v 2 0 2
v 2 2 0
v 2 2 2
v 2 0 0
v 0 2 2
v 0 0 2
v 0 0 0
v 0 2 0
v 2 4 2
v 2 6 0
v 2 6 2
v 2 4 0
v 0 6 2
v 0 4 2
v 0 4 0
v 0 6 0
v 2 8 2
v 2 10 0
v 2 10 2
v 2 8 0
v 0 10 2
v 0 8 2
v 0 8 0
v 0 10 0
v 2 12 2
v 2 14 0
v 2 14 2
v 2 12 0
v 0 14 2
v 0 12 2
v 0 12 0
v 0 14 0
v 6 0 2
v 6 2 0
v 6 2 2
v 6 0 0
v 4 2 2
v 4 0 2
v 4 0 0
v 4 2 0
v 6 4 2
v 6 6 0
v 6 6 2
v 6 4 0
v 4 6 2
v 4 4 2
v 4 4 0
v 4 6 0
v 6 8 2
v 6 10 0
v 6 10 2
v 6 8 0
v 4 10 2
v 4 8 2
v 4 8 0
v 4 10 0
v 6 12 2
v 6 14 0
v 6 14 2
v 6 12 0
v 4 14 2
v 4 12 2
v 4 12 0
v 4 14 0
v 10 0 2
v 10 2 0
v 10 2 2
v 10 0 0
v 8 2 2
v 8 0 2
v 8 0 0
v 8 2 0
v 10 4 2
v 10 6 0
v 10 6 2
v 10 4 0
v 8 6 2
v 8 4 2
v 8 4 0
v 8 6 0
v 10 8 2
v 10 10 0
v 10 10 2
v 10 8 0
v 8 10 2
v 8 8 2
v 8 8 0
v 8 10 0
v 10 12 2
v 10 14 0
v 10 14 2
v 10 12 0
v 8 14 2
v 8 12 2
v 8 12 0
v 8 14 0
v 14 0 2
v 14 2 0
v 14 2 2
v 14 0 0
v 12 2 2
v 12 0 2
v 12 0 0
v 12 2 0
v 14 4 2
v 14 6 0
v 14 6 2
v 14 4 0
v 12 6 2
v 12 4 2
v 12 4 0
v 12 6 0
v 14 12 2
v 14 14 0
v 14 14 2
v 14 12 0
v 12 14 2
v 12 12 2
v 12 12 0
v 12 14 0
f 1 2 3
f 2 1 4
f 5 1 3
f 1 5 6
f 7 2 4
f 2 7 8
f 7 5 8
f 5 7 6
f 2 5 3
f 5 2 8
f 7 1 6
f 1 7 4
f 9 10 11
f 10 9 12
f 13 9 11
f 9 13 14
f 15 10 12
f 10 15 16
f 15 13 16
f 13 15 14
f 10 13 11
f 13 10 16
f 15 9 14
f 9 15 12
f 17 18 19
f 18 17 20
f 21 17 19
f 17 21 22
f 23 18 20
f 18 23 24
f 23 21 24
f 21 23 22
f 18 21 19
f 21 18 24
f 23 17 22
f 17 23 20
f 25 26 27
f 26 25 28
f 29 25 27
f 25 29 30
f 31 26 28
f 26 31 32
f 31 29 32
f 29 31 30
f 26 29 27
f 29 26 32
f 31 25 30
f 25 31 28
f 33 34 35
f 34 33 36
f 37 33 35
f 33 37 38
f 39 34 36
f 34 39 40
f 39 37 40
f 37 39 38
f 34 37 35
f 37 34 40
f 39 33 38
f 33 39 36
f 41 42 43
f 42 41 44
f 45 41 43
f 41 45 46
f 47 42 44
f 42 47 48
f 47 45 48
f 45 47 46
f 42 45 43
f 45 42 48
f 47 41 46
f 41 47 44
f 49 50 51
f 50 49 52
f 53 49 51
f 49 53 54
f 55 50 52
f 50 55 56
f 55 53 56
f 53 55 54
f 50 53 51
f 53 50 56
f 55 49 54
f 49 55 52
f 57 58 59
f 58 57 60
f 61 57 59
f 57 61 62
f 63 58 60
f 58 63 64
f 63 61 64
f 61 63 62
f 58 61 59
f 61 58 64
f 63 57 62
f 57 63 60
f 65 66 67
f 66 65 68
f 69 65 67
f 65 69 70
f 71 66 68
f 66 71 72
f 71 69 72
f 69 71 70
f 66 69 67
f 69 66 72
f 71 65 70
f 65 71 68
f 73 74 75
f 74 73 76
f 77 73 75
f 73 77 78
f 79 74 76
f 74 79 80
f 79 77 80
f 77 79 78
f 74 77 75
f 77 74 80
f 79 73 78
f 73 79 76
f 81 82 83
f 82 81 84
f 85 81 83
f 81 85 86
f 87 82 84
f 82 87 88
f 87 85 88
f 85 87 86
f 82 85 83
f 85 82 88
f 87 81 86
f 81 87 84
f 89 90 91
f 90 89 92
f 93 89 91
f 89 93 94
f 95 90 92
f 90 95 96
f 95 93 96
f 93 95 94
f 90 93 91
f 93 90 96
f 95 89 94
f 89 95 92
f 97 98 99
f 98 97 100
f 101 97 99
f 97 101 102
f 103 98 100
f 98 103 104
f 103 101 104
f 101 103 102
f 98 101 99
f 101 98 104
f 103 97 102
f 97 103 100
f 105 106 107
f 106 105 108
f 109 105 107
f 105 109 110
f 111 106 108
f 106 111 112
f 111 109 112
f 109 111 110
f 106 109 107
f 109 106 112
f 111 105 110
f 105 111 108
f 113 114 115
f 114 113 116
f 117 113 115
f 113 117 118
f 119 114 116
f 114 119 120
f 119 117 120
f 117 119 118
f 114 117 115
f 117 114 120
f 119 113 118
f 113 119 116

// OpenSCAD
union() {
  for (ix = [0:3]) {
    for (iy = [0:3]) {
      if (!(ix == 3 && iy == 2)) {
        translate([ix * 4, iy * 4, 0]) cube(size=[2,2,2], center=false);
      }
    }
  }
}
